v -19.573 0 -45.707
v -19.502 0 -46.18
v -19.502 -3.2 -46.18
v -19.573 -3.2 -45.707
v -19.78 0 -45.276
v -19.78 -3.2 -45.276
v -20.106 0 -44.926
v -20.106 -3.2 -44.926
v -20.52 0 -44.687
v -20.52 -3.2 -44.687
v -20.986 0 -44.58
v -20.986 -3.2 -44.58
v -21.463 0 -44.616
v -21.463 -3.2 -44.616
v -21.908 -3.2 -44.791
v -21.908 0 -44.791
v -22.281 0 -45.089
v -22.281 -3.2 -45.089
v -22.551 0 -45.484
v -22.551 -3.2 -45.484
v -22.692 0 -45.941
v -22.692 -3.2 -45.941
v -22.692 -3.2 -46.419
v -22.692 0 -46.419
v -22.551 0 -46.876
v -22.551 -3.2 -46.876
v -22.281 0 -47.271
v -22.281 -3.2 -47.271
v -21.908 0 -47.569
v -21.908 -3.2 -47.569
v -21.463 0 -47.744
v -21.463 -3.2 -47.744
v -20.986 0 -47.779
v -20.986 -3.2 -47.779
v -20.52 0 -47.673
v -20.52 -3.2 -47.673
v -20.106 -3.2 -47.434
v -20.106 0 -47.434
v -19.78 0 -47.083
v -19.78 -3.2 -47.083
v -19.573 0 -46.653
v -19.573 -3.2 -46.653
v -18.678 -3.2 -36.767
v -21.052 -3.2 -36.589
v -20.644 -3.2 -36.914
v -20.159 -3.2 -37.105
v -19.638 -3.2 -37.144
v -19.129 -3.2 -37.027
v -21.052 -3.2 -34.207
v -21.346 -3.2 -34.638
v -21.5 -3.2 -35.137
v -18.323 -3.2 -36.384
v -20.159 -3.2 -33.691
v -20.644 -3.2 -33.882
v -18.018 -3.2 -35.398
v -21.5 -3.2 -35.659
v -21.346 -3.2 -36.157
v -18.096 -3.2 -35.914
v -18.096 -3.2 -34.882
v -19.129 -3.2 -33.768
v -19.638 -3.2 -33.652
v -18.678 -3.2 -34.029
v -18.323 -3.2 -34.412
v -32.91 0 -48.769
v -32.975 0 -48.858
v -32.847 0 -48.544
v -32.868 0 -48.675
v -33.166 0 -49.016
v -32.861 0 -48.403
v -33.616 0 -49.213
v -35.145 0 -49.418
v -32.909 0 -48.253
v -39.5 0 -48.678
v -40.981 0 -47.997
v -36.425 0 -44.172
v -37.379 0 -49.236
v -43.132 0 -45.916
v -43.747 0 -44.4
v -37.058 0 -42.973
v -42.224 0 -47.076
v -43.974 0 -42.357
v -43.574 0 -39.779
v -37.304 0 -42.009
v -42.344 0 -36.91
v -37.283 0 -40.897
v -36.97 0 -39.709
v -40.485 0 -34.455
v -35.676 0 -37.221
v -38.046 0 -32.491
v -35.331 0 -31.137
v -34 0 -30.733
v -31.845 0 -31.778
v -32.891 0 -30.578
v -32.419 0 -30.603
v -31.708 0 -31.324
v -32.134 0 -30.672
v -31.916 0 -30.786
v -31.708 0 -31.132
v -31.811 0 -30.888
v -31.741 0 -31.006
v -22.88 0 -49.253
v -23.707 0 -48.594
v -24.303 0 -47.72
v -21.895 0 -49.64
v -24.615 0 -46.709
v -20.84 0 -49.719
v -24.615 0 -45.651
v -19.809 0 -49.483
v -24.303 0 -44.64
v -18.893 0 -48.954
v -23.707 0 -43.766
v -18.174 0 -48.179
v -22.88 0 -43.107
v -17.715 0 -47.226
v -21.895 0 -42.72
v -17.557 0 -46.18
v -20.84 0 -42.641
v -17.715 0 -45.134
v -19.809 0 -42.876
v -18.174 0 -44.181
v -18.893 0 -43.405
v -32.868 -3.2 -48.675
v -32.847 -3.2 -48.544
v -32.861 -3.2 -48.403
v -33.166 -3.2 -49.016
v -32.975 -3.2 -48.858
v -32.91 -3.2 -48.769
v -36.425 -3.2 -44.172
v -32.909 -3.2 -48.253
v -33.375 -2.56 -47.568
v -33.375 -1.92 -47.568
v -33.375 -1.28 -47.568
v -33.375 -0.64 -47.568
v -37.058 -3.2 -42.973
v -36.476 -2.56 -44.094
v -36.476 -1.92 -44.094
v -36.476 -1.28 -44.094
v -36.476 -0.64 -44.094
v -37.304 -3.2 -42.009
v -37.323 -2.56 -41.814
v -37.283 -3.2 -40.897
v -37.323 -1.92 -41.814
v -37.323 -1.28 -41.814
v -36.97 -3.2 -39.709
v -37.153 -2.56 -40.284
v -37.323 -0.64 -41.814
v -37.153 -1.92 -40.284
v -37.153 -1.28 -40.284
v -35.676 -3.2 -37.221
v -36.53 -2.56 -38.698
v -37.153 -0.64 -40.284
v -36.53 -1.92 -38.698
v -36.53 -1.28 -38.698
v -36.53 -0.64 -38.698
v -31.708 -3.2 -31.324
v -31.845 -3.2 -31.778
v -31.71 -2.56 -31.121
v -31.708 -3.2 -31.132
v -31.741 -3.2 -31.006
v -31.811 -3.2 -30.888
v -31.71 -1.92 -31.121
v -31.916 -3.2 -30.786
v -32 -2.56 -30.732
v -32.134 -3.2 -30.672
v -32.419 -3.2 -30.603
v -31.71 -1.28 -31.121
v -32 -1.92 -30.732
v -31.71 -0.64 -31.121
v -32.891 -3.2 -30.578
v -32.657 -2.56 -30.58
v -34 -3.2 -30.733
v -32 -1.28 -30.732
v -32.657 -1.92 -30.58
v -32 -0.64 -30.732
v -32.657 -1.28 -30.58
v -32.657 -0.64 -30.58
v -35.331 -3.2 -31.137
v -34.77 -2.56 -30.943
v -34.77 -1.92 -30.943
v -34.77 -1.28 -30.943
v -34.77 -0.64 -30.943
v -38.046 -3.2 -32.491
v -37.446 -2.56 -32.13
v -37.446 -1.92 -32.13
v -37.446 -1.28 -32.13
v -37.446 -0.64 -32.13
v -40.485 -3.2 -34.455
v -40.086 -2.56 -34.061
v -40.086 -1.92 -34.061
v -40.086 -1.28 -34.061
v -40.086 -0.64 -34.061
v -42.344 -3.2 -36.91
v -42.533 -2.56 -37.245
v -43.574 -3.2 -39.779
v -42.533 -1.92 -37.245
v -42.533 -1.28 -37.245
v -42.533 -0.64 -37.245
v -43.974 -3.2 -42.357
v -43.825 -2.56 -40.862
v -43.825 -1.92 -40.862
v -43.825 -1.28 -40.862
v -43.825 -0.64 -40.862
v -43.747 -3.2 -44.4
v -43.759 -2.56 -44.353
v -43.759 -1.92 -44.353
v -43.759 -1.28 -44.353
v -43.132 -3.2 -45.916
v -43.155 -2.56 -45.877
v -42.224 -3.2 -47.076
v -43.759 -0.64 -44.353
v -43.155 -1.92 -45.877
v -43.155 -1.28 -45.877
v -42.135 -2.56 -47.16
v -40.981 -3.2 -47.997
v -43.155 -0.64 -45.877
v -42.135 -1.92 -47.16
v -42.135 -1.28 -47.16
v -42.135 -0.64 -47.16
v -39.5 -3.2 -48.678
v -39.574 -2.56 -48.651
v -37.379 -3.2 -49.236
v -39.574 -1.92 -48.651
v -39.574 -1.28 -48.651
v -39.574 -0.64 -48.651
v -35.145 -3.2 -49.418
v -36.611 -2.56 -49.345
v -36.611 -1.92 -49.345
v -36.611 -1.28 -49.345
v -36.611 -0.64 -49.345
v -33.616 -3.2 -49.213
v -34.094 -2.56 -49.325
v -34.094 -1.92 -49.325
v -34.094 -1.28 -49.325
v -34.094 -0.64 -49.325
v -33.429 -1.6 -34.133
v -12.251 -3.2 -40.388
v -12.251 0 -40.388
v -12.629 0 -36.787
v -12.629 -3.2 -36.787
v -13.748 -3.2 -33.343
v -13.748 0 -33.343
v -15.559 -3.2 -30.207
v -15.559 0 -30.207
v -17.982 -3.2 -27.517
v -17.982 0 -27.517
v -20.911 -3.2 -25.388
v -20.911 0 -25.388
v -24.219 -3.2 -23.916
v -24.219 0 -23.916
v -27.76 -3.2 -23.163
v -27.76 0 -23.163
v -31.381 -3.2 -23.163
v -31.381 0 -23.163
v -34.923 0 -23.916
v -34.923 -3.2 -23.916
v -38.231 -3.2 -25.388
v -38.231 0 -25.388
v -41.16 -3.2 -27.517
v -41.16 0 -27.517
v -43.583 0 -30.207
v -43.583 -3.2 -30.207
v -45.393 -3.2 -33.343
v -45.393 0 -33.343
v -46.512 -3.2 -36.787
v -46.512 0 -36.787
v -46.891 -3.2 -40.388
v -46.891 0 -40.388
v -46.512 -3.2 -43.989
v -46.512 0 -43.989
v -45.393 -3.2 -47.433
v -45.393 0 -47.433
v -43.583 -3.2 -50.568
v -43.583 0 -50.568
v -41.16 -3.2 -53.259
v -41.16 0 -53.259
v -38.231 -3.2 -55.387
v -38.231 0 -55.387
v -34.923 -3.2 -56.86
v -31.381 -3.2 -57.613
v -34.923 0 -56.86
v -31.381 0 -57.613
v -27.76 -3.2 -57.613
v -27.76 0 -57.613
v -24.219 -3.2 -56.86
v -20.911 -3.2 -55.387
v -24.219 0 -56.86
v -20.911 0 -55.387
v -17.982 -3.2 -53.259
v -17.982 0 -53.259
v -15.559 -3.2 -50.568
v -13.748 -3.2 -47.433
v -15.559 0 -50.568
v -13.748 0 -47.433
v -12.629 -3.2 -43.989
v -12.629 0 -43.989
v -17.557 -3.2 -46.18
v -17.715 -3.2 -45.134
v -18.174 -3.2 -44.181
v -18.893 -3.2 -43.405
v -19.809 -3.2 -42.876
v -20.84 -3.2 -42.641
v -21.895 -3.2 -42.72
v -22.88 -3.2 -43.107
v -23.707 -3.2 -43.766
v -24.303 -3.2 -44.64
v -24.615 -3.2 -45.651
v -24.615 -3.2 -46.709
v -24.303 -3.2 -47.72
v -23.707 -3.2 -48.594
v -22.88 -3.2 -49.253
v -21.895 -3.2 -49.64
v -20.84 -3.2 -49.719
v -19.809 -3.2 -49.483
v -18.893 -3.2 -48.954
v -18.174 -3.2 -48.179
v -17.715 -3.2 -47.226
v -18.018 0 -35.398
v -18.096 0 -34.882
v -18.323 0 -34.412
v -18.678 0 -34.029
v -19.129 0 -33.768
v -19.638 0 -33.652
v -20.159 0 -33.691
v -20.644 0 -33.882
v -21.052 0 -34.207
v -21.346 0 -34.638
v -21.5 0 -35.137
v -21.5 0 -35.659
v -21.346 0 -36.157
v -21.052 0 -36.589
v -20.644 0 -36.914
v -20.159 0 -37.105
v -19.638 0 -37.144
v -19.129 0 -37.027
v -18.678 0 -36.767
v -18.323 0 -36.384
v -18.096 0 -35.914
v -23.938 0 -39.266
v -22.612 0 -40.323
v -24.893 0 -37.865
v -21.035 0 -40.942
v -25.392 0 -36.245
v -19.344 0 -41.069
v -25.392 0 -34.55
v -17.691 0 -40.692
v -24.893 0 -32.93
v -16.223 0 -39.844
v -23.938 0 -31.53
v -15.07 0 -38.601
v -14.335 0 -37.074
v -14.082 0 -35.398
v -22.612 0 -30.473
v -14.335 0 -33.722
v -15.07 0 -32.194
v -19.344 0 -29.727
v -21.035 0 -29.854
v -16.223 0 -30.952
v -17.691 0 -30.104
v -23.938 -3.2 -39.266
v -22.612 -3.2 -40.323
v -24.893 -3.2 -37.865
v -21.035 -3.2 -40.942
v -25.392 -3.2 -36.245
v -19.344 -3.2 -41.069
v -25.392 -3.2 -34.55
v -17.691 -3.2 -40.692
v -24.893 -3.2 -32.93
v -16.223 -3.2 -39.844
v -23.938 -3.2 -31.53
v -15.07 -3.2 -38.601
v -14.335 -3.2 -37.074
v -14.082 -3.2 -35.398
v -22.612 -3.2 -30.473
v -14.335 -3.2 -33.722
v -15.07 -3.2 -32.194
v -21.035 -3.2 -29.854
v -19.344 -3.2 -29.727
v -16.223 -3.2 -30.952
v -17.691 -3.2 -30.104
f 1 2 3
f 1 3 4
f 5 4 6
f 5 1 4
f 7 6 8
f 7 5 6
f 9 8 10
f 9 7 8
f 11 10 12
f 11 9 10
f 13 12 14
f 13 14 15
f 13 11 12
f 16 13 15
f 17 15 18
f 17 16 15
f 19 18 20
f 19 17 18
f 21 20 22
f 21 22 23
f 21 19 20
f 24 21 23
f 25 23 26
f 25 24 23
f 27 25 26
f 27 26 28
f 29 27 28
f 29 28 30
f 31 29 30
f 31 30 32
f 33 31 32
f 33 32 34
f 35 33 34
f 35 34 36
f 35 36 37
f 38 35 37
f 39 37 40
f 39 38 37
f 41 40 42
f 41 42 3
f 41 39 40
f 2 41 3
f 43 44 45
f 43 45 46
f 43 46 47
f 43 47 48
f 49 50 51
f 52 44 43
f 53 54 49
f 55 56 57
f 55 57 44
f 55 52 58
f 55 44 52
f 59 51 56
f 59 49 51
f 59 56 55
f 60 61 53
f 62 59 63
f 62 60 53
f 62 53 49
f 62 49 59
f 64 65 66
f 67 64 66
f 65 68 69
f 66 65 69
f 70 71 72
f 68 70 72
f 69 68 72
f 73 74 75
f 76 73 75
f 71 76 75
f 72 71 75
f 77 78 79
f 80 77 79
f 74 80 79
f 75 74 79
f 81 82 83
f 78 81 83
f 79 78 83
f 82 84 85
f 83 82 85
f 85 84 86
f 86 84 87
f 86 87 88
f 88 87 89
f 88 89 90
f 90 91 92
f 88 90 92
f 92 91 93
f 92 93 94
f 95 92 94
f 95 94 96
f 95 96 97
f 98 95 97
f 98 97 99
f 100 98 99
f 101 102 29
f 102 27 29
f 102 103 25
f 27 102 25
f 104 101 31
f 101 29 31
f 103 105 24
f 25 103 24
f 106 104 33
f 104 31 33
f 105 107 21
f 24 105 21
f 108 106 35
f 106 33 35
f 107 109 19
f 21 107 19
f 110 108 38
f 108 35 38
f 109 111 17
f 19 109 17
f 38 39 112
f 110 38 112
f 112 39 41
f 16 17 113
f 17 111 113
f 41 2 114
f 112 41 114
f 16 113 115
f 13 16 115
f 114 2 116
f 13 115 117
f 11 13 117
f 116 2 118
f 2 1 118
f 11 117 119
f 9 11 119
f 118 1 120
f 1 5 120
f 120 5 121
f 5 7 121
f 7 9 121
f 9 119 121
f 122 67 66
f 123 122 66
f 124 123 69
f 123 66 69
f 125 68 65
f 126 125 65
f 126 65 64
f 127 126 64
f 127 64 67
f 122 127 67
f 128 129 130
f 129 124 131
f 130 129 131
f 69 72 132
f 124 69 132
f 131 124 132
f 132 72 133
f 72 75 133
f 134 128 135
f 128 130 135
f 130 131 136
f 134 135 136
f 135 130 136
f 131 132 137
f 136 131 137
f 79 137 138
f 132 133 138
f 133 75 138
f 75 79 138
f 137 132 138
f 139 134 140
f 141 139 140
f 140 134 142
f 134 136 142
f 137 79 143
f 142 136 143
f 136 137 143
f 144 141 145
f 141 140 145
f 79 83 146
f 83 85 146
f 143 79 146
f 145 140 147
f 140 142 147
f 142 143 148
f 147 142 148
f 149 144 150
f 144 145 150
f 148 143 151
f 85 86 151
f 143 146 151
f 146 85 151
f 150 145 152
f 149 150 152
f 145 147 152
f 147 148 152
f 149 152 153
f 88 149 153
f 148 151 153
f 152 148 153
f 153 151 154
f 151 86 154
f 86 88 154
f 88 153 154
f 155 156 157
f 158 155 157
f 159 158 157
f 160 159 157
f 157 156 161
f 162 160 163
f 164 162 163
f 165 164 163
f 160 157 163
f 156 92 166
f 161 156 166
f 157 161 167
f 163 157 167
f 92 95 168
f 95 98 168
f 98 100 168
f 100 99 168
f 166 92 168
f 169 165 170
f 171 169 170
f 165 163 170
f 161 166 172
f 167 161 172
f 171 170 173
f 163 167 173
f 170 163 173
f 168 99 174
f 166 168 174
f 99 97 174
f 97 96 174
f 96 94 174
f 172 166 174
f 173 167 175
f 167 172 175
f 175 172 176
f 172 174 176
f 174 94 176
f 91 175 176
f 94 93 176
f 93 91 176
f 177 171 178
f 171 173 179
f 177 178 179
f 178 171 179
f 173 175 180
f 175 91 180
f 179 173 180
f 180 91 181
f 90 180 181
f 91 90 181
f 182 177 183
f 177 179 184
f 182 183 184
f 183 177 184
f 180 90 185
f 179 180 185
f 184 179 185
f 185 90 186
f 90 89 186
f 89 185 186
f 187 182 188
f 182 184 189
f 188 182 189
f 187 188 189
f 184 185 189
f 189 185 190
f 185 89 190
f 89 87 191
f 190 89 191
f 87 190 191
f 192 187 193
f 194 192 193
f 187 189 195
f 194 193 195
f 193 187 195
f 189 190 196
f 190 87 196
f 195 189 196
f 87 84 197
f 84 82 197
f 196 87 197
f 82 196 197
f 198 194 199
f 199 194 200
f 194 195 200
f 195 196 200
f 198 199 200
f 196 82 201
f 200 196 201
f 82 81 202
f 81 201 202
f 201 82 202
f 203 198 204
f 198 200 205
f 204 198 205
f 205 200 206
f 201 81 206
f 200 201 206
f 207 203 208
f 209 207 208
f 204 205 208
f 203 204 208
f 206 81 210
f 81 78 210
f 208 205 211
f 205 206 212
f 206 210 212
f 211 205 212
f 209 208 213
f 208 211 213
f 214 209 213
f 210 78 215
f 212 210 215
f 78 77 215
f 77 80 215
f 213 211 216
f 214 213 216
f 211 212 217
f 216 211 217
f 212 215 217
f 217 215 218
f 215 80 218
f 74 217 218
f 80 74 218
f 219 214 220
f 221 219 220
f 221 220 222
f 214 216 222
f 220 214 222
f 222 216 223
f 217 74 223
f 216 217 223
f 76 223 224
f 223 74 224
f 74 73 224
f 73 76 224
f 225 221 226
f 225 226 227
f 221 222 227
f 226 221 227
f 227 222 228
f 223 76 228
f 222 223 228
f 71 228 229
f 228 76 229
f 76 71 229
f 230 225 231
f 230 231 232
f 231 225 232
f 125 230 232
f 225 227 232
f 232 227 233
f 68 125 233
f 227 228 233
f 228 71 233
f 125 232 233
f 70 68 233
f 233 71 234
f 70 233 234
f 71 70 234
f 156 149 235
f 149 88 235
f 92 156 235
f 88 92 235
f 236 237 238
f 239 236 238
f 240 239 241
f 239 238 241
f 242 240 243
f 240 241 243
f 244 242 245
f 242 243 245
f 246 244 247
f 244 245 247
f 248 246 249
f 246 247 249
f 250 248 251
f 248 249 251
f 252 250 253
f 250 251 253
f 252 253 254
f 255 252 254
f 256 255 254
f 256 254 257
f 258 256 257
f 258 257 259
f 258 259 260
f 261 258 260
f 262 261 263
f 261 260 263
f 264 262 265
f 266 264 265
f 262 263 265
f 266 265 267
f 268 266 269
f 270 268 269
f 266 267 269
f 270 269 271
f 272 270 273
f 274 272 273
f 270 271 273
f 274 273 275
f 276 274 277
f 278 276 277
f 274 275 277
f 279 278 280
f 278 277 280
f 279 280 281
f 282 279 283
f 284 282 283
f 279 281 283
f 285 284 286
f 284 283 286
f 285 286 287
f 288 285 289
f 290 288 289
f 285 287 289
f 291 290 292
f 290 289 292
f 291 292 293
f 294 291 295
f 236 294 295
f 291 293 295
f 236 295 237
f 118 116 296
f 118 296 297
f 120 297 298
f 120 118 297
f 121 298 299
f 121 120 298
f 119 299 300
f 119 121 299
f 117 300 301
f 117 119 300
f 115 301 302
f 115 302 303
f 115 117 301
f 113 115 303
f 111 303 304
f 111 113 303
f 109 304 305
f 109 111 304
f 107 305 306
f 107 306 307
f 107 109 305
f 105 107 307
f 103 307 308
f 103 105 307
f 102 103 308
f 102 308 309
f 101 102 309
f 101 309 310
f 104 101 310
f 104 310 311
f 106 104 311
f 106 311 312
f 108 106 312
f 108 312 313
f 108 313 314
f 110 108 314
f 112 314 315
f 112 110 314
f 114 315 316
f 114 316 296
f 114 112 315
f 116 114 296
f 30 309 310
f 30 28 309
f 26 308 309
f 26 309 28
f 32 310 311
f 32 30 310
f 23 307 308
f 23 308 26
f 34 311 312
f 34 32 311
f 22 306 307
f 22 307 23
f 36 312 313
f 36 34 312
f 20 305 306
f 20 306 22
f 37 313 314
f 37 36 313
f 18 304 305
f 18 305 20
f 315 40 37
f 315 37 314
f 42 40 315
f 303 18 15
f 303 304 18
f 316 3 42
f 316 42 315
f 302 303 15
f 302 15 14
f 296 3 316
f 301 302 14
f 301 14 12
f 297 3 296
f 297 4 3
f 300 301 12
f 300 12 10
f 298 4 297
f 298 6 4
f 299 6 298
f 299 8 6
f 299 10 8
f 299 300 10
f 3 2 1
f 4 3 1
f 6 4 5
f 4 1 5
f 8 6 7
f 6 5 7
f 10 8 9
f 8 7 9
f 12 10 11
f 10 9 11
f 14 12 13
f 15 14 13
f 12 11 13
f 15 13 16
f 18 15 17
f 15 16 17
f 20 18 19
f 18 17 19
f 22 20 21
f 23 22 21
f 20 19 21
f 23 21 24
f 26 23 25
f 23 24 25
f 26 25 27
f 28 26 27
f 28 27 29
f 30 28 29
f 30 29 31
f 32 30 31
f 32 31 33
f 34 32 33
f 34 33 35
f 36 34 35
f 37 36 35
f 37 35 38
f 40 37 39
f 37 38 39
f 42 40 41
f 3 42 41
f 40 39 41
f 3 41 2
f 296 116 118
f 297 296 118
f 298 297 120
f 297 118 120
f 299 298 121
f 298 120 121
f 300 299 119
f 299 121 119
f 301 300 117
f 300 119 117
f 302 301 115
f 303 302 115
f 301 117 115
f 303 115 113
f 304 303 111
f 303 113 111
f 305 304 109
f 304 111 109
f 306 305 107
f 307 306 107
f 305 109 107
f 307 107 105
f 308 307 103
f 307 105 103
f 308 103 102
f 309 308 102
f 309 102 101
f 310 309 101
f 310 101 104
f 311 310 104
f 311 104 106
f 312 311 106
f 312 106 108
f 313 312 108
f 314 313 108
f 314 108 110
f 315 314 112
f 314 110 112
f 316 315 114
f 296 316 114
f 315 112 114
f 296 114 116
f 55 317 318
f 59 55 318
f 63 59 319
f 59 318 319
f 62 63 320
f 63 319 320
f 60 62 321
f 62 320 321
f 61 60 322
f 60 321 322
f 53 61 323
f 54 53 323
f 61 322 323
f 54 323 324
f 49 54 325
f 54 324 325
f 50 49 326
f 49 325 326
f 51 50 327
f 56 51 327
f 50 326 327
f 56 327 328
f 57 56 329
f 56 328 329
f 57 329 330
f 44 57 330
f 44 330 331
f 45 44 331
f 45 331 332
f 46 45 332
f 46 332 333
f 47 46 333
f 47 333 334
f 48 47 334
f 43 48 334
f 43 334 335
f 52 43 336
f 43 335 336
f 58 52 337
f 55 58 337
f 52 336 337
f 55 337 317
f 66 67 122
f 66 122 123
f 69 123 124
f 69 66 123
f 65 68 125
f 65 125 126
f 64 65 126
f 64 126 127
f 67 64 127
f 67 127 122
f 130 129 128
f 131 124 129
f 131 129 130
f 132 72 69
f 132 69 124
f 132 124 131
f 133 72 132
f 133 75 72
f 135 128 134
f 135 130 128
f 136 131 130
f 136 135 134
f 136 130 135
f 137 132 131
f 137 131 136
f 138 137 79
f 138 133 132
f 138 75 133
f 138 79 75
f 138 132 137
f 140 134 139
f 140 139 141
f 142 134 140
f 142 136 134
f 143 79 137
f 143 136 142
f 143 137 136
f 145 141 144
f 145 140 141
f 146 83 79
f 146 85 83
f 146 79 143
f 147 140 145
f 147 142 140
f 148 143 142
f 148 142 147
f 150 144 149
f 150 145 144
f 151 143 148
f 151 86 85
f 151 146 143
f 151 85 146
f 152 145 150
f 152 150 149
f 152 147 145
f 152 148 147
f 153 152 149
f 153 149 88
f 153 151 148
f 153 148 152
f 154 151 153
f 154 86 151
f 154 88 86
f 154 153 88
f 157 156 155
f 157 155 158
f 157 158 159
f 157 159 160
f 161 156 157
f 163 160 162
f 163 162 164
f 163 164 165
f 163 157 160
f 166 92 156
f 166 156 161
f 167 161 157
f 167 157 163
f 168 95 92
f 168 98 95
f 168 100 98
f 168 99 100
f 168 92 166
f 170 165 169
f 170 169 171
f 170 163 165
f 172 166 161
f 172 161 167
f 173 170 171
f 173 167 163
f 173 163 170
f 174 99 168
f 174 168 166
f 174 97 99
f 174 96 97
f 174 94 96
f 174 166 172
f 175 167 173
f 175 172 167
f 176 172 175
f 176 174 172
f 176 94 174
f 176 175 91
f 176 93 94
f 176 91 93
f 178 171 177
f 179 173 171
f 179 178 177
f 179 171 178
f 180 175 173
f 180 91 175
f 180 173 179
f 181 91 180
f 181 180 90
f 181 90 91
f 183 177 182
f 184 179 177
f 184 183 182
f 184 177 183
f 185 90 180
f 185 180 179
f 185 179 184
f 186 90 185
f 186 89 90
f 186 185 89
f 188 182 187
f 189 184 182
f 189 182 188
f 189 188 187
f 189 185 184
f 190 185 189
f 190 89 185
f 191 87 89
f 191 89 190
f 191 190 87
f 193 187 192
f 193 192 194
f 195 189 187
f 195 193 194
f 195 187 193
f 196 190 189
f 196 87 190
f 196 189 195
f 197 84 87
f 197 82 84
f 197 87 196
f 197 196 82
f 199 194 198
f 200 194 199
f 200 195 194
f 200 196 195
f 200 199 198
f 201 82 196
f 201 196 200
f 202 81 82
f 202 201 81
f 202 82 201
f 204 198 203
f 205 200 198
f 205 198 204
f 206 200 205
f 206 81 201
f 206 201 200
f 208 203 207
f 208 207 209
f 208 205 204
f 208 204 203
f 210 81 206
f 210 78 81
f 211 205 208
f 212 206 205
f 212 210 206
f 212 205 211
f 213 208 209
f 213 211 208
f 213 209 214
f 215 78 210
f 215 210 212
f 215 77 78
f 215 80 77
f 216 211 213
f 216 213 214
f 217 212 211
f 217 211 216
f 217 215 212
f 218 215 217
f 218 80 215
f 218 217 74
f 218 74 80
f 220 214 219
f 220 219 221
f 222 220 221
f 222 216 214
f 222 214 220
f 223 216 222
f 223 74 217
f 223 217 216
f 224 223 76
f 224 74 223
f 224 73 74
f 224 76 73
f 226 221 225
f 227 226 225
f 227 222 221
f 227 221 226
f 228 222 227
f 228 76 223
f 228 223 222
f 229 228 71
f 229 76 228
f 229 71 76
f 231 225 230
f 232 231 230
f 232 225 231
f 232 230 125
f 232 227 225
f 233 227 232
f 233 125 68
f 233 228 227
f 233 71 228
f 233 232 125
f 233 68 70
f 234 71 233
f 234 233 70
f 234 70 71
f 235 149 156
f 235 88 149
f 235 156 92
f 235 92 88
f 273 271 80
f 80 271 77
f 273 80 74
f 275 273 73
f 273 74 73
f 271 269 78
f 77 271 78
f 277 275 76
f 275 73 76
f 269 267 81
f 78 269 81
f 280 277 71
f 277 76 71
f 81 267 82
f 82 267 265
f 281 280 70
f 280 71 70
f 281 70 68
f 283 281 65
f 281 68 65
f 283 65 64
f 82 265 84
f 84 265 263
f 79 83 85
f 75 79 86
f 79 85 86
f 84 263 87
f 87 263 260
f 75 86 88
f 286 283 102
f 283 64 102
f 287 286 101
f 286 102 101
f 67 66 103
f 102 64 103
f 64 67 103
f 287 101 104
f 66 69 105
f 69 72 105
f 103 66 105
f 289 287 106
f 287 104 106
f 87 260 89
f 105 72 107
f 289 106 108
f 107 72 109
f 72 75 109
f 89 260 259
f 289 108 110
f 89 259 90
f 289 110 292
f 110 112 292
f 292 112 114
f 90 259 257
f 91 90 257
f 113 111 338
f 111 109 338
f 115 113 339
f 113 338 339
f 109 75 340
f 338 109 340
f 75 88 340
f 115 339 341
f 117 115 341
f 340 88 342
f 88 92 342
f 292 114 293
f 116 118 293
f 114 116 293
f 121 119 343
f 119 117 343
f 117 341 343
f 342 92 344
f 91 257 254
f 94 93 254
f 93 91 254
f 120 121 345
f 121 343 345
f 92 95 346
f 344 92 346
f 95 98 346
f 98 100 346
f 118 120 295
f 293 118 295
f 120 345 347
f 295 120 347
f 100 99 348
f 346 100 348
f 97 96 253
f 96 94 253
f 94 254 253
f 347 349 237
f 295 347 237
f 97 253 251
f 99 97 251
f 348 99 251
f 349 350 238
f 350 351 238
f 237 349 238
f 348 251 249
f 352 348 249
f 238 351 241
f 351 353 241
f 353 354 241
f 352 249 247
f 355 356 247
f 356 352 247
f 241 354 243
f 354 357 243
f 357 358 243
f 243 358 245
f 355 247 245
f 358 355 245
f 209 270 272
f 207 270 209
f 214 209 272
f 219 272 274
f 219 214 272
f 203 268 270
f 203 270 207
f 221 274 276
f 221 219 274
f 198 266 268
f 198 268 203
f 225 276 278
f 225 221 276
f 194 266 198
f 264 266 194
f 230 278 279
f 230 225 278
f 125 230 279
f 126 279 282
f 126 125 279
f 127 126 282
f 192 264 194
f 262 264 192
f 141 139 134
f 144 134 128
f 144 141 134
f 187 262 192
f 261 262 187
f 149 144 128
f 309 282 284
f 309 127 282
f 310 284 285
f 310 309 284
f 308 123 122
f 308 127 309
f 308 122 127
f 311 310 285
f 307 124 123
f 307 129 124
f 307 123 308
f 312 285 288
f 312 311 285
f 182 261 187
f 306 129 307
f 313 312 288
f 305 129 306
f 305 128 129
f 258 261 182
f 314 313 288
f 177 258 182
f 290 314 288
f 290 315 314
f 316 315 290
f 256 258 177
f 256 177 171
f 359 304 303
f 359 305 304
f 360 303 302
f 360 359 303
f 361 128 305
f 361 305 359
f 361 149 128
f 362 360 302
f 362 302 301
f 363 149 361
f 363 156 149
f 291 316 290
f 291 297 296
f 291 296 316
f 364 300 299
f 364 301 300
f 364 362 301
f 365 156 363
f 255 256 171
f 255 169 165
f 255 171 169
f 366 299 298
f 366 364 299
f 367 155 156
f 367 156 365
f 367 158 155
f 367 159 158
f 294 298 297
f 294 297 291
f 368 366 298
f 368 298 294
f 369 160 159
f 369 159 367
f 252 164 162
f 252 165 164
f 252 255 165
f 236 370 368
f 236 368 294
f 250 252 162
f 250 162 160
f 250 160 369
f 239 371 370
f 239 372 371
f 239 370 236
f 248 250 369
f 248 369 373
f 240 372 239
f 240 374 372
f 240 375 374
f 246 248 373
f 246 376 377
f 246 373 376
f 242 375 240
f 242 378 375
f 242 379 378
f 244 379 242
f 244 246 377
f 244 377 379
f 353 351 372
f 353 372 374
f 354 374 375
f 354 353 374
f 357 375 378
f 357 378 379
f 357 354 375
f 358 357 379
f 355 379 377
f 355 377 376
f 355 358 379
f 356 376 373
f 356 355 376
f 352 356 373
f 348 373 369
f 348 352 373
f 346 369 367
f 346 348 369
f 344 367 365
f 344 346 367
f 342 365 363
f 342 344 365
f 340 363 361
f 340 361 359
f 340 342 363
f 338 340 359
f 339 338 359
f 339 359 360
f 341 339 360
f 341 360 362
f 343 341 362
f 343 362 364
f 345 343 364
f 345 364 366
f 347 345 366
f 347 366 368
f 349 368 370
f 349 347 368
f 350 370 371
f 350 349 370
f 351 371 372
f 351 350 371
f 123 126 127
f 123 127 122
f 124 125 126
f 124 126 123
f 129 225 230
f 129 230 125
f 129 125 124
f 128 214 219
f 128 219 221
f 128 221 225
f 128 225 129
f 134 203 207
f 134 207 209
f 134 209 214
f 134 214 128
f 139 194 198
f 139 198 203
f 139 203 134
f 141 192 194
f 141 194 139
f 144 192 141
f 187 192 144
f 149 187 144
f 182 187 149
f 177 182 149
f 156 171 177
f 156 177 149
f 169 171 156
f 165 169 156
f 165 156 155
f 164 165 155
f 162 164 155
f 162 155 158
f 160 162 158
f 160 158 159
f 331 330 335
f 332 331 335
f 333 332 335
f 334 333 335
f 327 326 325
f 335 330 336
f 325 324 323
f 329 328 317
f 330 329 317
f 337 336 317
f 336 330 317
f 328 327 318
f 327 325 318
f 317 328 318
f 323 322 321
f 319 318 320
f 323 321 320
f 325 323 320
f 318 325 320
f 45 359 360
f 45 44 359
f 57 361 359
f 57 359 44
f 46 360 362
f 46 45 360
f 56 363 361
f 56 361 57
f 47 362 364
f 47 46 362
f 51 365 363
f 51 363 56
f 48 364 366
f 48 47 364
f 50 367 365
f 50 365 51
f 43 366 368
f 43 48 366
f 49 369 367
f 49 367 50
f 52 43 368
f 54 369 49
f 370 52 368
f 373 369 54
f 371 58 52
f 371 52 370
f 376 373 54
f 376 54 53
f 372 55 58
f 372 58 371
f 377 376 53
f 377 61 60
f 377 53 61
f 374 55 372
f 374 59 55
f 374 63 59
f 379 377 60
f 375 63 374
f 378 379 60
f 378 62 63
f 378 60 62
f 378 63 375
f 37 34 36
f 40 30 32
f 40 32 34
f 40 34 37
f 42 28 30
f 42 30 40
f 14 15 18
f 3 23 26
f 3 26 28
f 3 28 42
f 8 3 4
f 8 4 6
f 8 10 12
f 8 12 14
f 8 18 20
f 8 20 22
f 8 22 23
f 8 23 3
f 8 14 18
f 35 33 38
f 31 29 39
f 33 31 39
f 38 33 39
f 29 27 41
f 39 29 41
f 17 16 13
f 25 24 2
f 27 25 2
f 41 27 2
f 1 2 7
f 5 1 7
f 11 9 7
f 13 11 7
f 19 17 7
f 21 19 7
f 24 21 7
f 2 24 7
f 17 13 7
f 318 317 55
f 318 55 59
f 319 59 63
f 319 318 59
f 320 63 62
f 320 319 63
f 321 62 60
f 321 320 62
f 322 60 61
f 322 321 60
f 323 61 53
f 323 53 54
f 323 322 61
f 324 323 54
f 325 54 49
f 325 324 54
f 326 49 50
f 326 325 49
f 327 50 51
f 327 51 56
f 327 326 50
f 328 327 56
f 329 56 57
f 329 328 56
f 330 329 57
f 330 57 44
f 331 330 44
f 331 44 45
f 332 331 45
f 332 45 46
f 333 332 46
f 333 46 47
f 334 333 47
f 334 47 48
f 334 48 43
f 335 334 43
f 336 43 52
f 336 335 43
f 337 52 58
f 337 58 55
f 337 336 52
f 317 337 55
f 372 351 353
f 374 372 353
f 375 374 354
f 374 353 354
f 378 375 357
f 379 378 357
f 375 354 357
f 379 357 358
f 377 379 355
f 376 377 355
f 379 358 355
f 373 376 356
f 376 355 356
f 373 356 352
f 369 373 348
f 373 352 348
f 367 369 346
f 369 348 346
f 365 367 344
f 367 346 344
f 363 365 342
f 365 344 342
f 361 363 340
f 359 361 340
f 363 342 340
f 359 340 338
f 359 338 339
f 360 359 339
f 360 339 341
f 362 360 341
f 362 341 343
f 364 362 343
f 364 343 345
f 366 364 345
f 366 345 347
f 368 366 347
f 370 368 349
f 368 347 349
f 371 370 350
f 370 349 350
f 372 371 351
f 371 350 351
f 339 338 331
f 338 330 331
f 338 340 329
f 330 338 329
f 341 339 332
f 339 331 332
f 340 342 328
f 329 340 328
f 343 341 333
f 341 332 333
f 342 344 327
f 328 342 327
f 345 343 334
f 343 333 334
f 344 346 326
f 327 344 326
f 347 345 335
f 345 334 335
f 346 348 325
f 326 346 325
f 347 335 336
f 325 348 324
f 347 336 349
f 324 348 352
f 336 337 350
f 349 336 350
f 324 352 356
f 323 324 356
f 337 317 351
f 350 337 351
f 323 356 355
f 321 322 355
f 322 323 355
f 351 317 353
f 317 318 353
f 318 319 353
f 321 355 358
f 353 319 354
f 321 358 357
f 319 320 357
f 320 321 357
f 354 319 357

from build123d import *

# Parameters (mm, degrees)
F0_R     = 17.3199569185
F0_R_2   = 3.5486855121
F0_R_3   = 5.686867303
F1_DEPTH = 3.2
F0_R_4   = 1.6039423645
F2_DEPTH = 3.2
F0_R_5   = 1.7506899316
F3_DEPTH = 3.2


with BuildPart() as f1:
    # F0 (on Front) → F1 (new body)
    with BuildSketch(Plane.XZ):
        with Locations((-29.5709185302, -40.3878651559)):
            Circle(F0_R)
        with Locations((-21.1056768894, -46.1798720062)):
            Circle(F0_R_2, mode=Mode.SUBTRACT)
        with BuildLine():
            add(Edge.make_bspline(
                [(-32.8679084778, -48.6748889089), (-32.4964057005, -47.5071913989), (-42.6710625419, -42.1027881923), (-26.1784821552, -28.2864358363), (-42.883612091, -32.5721176947), (-46.6074856878, -49.4680572919), (-33.2659219615, -49.9259141562), (-32.8679084778, -48.6748889089)],
                knots=[0, 0, 0, 0, 0.1785366706, 0.3954593042, 0.5814392582, 0.8087228236, 1, 1, 1, 1], degree=3))
        make_face(mode=Mode.SUBTRACT)
        with Locations((-19.7690594941, -35.3978276253)):
            Circle(F0_R_3, mode=Mode.SUBTRACT)
    extrude(amount=F1_DEPTH)


with BuildPart() as f2:
    # F0 (on Front) → F2 (new body)
    with BuildSketch(Plane.XZ):
        with Locations((-21.1056768894, -46.1798720062)):
            Circle(F0_R_2)
        with Locations((-21.1056768894, -46.1798720062)):
            Circle(F0_R_4, mode=Mode.SUBTRACT)
    extrude(amount=F2_DEPTH)


with BuildPart() as f2b:
    # F0 (on Front) → F2, piece 2 (new body)
    with BuildSketch(Plane.XZ):
        with Locations((-19.7690594941, -35.3978276253)):
            Circle(F0_R_3)
        with Locations((-19.7690594941, -35.3978276253)):
            Circle(F0_R_5, mode=Mode.SUBTRACT)
    extrude(amount=F2_DEPTH)


with BuildPart() as f3:
    # F0 (on Front) → F3 (new body)
    with BuildSketch(Plane.XZ):
        with Locations((-21.1056768894, -46.1798720062)):
            Circle(F0_R_4)
    extrude(amount=F3_DEPTH)


with BuildPart() as f3b:
    # F0 (on Front) → F3, piece 2 (new body)
    with BuildSketch(Plane.XZ):
        with Locations((-19.7690594941, -35.3978276253)):
            Circle(F0_R_5)
    extrude(amount=F3_DEPTH)


with BuildPart() as f3c:
    # F0 (on Front) → F3, piece 3 (new body)
    with BuildSketch(Plane.XZ):
        with BuildLine():
            add(Edge.make_bspline(
                [(-32.8679084778, -48.6748889089), (-32.4964057005, -47.5071913989), (-42.6710625419, -42.1027881923), (-26.1784821552, -28.2864358363), (-42.883612091, -32.5721176947), (-46.6074856878, -49.4680572919), (-33.2659219615, -49.9259141562), (-32.8679084778, -48.6748889089)],
                knots=[0, 0, 0, 0, 0.1785366706, 0.3954593042, 0.5814392582, 0.8087228236, 1, 1, 1, 1], degree=3))
        make_face()
    extrude(amount=F3_DEPTH)


solid = Compound([f1.part, f2.part, f2b.part, f3.part, f3b.part, f3c.part])
